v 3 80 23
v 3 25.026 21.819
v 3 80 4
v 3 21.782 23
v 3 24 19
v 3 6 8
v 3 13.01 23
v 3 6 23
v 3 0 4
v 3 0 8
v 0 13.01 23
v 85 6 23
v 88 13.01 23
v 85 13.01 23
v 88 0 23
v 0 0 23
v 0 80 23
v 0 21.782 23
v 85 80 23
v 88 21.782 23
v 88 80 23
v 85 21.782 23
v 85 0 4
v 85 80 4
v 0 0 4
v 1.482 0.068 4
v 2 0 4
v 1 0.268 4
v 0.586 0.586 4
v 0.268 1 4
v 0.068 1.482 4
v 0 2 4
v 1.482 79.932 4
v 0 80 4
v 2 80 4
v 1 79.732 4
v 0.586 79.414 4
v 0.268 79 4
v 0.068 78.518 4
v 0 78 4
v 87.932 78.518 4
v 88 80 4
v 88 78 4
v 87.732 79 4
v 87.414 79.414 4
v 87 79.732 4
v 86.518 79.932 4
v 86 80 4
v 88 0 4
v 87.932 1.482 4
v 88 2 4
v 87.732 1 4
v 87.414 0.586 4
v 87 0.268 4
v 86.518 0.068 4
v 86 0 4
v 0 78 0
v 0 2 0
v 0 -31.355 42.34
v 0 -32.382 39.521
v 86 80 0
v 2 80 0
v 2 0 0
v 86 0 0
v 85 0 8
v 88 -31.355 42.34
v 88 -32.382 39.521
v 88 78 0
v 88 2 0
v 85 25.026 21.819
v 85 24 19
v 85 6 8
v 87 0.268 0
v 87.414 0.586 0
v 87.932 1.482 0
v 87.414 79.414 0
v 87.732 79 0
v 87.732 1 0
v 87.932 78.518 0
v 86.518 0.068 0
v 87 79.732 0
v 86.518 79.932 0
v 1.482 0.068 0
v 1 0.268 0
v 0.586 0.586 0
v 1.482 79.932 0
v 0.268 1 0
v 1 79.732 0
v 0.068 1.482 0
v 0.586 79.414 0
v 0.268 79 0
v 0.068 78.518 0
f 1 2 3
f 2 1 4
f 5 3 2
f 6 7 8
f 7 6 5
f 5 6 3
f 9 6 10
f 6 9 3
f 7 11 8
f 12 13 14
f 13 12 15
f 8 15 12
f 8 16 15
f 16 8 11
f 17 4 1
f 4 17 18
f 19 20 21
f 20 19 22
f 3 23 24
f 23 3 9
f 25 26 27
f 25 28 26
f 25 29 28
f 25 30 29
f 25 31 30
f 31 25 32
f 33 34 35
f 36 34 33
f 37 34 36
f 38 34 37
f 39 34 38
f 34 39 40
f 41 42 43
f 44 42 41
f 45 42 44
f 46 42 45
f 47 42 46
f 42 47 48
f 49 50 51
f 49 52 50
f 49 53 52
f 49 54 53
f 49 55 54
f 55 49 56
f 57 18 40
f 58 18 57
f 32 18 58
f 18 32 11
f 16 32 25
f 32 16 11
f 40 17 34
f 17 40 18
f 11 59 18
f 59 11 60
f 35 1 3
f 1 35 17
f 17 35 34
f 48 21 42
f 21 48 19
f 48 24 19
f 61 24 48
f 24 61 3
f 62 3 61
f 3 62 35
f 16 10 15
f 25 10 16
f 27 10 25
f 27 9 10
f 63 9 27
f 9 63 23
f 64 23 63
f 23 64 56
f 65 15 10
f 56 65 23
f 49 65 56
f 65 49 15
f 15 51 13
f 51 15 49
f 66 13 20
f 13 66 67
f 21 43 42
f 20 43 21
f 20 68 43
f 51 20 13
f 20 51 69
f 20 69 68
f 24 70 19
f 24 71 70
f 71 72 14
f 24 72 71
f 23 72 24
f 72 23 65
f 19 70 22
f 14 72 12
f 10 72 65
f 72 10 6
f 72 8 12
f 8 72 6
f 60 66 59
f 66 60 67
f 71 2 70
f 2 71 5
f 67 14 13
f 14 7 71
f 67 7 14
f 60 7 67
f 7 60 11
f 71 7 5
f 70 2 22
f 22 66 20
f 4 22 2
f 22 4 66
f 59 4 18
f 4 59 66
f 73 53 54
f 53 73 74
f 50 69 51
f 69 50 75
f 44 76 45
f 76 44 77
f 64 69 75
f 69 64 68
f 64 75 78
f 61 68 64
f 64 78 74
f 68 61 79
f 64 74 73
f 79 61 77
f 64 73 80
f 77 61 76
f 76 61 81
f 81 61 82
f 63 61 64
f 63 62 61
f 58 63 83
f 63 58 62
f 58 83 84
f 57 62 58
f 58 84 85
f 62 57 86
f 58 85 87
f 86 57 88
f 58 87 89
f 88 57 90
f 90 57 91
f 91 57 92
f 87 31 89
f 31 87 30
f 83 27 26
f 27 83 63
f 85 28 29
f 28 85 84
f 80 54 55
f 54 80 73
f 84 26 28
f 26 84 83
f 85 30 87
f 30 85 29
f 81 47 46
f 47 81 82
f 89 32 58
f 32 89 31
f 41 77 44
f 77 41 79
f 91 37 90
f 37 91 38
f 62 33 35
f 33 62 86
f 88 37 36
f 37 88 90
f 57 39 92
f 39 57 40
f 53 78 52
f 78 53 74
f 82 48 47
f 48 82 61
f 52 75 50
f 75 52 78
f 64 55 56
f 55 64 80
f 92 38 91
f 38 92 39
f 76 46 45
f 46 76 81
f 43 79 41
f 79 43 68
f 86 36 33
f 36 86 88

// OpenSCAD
// ============================================================
// Phone Stand — Parametric / 3D Print
// ============================================================
// Sample model: desk phone holder, adjustable angle + width
// Parameters are defined at top for easy customization.

// ---- PARAMETERS ----
phone_w    = 80;    // Phone width (mm) — iPhone 15: 71mm, S24: 70mm, +cases: up to 85mm
phone_t    = 12;    // Phone thickness (mm) — typical 10–15mm with case
base_d     = 80;    // Base depth (mm)
base_t     = 4;     // Base thickness (mm)
angle      = 70;    // Viewing angle from vertical (degrees) — 60–80 feels natural
wall       = 3;     // Wall/support thickness
lip_h      = 15;    // Bottom lip height to retain phone (mm)
fillet     = 2;     // Corner fillet radius

// ---- DERIVED ----
slot_w     = phone_w + 2;    // Slot slightly wider than phone
slot_h     = phone_t + 1.5;  // Slot slightly deeper than phone

// ---- BASE PLATE ----
module base() {
    hull() {
        for (x = [fillet, slot_w + wall*2 - fillet], y = [fillet, base_d - fillet]) {
            translate([x, y, 0]) cylinder(r=fillet, h=base_t, $fn=24);
        }
    }
}

// ---- REAR SUPPORT ----
// Angled back that the phone rests against
module rear_support() {
    support_h = 60;
    rotate([angle, 0, 0])
    translate([0, 0, 0])
    cube([slot_w + wall*2, wall, support_h]);
}

// ---- SIDE WALLS ----
module side_walls() {
    cube([wall, base_d, lip_h + base_t]);
    translate([slot_w + wall, 0, 0])
        cube([wall, base_d, lip_h + base_t]);
}

// ---- BOTTOM LIP ----
module bottom_lip() {
    translate([wall, 0, base_t])
        cube([slot_w, wall*2, lip_h]);
}

// ---- ASSEMBLE ----
union() {
    base();
    translate([0, 0, base_t]) {
        side_walls();
        bottom_lip();
        translate([0, base_d * 0.3, lip_h])
            rear_support();
    }
}
